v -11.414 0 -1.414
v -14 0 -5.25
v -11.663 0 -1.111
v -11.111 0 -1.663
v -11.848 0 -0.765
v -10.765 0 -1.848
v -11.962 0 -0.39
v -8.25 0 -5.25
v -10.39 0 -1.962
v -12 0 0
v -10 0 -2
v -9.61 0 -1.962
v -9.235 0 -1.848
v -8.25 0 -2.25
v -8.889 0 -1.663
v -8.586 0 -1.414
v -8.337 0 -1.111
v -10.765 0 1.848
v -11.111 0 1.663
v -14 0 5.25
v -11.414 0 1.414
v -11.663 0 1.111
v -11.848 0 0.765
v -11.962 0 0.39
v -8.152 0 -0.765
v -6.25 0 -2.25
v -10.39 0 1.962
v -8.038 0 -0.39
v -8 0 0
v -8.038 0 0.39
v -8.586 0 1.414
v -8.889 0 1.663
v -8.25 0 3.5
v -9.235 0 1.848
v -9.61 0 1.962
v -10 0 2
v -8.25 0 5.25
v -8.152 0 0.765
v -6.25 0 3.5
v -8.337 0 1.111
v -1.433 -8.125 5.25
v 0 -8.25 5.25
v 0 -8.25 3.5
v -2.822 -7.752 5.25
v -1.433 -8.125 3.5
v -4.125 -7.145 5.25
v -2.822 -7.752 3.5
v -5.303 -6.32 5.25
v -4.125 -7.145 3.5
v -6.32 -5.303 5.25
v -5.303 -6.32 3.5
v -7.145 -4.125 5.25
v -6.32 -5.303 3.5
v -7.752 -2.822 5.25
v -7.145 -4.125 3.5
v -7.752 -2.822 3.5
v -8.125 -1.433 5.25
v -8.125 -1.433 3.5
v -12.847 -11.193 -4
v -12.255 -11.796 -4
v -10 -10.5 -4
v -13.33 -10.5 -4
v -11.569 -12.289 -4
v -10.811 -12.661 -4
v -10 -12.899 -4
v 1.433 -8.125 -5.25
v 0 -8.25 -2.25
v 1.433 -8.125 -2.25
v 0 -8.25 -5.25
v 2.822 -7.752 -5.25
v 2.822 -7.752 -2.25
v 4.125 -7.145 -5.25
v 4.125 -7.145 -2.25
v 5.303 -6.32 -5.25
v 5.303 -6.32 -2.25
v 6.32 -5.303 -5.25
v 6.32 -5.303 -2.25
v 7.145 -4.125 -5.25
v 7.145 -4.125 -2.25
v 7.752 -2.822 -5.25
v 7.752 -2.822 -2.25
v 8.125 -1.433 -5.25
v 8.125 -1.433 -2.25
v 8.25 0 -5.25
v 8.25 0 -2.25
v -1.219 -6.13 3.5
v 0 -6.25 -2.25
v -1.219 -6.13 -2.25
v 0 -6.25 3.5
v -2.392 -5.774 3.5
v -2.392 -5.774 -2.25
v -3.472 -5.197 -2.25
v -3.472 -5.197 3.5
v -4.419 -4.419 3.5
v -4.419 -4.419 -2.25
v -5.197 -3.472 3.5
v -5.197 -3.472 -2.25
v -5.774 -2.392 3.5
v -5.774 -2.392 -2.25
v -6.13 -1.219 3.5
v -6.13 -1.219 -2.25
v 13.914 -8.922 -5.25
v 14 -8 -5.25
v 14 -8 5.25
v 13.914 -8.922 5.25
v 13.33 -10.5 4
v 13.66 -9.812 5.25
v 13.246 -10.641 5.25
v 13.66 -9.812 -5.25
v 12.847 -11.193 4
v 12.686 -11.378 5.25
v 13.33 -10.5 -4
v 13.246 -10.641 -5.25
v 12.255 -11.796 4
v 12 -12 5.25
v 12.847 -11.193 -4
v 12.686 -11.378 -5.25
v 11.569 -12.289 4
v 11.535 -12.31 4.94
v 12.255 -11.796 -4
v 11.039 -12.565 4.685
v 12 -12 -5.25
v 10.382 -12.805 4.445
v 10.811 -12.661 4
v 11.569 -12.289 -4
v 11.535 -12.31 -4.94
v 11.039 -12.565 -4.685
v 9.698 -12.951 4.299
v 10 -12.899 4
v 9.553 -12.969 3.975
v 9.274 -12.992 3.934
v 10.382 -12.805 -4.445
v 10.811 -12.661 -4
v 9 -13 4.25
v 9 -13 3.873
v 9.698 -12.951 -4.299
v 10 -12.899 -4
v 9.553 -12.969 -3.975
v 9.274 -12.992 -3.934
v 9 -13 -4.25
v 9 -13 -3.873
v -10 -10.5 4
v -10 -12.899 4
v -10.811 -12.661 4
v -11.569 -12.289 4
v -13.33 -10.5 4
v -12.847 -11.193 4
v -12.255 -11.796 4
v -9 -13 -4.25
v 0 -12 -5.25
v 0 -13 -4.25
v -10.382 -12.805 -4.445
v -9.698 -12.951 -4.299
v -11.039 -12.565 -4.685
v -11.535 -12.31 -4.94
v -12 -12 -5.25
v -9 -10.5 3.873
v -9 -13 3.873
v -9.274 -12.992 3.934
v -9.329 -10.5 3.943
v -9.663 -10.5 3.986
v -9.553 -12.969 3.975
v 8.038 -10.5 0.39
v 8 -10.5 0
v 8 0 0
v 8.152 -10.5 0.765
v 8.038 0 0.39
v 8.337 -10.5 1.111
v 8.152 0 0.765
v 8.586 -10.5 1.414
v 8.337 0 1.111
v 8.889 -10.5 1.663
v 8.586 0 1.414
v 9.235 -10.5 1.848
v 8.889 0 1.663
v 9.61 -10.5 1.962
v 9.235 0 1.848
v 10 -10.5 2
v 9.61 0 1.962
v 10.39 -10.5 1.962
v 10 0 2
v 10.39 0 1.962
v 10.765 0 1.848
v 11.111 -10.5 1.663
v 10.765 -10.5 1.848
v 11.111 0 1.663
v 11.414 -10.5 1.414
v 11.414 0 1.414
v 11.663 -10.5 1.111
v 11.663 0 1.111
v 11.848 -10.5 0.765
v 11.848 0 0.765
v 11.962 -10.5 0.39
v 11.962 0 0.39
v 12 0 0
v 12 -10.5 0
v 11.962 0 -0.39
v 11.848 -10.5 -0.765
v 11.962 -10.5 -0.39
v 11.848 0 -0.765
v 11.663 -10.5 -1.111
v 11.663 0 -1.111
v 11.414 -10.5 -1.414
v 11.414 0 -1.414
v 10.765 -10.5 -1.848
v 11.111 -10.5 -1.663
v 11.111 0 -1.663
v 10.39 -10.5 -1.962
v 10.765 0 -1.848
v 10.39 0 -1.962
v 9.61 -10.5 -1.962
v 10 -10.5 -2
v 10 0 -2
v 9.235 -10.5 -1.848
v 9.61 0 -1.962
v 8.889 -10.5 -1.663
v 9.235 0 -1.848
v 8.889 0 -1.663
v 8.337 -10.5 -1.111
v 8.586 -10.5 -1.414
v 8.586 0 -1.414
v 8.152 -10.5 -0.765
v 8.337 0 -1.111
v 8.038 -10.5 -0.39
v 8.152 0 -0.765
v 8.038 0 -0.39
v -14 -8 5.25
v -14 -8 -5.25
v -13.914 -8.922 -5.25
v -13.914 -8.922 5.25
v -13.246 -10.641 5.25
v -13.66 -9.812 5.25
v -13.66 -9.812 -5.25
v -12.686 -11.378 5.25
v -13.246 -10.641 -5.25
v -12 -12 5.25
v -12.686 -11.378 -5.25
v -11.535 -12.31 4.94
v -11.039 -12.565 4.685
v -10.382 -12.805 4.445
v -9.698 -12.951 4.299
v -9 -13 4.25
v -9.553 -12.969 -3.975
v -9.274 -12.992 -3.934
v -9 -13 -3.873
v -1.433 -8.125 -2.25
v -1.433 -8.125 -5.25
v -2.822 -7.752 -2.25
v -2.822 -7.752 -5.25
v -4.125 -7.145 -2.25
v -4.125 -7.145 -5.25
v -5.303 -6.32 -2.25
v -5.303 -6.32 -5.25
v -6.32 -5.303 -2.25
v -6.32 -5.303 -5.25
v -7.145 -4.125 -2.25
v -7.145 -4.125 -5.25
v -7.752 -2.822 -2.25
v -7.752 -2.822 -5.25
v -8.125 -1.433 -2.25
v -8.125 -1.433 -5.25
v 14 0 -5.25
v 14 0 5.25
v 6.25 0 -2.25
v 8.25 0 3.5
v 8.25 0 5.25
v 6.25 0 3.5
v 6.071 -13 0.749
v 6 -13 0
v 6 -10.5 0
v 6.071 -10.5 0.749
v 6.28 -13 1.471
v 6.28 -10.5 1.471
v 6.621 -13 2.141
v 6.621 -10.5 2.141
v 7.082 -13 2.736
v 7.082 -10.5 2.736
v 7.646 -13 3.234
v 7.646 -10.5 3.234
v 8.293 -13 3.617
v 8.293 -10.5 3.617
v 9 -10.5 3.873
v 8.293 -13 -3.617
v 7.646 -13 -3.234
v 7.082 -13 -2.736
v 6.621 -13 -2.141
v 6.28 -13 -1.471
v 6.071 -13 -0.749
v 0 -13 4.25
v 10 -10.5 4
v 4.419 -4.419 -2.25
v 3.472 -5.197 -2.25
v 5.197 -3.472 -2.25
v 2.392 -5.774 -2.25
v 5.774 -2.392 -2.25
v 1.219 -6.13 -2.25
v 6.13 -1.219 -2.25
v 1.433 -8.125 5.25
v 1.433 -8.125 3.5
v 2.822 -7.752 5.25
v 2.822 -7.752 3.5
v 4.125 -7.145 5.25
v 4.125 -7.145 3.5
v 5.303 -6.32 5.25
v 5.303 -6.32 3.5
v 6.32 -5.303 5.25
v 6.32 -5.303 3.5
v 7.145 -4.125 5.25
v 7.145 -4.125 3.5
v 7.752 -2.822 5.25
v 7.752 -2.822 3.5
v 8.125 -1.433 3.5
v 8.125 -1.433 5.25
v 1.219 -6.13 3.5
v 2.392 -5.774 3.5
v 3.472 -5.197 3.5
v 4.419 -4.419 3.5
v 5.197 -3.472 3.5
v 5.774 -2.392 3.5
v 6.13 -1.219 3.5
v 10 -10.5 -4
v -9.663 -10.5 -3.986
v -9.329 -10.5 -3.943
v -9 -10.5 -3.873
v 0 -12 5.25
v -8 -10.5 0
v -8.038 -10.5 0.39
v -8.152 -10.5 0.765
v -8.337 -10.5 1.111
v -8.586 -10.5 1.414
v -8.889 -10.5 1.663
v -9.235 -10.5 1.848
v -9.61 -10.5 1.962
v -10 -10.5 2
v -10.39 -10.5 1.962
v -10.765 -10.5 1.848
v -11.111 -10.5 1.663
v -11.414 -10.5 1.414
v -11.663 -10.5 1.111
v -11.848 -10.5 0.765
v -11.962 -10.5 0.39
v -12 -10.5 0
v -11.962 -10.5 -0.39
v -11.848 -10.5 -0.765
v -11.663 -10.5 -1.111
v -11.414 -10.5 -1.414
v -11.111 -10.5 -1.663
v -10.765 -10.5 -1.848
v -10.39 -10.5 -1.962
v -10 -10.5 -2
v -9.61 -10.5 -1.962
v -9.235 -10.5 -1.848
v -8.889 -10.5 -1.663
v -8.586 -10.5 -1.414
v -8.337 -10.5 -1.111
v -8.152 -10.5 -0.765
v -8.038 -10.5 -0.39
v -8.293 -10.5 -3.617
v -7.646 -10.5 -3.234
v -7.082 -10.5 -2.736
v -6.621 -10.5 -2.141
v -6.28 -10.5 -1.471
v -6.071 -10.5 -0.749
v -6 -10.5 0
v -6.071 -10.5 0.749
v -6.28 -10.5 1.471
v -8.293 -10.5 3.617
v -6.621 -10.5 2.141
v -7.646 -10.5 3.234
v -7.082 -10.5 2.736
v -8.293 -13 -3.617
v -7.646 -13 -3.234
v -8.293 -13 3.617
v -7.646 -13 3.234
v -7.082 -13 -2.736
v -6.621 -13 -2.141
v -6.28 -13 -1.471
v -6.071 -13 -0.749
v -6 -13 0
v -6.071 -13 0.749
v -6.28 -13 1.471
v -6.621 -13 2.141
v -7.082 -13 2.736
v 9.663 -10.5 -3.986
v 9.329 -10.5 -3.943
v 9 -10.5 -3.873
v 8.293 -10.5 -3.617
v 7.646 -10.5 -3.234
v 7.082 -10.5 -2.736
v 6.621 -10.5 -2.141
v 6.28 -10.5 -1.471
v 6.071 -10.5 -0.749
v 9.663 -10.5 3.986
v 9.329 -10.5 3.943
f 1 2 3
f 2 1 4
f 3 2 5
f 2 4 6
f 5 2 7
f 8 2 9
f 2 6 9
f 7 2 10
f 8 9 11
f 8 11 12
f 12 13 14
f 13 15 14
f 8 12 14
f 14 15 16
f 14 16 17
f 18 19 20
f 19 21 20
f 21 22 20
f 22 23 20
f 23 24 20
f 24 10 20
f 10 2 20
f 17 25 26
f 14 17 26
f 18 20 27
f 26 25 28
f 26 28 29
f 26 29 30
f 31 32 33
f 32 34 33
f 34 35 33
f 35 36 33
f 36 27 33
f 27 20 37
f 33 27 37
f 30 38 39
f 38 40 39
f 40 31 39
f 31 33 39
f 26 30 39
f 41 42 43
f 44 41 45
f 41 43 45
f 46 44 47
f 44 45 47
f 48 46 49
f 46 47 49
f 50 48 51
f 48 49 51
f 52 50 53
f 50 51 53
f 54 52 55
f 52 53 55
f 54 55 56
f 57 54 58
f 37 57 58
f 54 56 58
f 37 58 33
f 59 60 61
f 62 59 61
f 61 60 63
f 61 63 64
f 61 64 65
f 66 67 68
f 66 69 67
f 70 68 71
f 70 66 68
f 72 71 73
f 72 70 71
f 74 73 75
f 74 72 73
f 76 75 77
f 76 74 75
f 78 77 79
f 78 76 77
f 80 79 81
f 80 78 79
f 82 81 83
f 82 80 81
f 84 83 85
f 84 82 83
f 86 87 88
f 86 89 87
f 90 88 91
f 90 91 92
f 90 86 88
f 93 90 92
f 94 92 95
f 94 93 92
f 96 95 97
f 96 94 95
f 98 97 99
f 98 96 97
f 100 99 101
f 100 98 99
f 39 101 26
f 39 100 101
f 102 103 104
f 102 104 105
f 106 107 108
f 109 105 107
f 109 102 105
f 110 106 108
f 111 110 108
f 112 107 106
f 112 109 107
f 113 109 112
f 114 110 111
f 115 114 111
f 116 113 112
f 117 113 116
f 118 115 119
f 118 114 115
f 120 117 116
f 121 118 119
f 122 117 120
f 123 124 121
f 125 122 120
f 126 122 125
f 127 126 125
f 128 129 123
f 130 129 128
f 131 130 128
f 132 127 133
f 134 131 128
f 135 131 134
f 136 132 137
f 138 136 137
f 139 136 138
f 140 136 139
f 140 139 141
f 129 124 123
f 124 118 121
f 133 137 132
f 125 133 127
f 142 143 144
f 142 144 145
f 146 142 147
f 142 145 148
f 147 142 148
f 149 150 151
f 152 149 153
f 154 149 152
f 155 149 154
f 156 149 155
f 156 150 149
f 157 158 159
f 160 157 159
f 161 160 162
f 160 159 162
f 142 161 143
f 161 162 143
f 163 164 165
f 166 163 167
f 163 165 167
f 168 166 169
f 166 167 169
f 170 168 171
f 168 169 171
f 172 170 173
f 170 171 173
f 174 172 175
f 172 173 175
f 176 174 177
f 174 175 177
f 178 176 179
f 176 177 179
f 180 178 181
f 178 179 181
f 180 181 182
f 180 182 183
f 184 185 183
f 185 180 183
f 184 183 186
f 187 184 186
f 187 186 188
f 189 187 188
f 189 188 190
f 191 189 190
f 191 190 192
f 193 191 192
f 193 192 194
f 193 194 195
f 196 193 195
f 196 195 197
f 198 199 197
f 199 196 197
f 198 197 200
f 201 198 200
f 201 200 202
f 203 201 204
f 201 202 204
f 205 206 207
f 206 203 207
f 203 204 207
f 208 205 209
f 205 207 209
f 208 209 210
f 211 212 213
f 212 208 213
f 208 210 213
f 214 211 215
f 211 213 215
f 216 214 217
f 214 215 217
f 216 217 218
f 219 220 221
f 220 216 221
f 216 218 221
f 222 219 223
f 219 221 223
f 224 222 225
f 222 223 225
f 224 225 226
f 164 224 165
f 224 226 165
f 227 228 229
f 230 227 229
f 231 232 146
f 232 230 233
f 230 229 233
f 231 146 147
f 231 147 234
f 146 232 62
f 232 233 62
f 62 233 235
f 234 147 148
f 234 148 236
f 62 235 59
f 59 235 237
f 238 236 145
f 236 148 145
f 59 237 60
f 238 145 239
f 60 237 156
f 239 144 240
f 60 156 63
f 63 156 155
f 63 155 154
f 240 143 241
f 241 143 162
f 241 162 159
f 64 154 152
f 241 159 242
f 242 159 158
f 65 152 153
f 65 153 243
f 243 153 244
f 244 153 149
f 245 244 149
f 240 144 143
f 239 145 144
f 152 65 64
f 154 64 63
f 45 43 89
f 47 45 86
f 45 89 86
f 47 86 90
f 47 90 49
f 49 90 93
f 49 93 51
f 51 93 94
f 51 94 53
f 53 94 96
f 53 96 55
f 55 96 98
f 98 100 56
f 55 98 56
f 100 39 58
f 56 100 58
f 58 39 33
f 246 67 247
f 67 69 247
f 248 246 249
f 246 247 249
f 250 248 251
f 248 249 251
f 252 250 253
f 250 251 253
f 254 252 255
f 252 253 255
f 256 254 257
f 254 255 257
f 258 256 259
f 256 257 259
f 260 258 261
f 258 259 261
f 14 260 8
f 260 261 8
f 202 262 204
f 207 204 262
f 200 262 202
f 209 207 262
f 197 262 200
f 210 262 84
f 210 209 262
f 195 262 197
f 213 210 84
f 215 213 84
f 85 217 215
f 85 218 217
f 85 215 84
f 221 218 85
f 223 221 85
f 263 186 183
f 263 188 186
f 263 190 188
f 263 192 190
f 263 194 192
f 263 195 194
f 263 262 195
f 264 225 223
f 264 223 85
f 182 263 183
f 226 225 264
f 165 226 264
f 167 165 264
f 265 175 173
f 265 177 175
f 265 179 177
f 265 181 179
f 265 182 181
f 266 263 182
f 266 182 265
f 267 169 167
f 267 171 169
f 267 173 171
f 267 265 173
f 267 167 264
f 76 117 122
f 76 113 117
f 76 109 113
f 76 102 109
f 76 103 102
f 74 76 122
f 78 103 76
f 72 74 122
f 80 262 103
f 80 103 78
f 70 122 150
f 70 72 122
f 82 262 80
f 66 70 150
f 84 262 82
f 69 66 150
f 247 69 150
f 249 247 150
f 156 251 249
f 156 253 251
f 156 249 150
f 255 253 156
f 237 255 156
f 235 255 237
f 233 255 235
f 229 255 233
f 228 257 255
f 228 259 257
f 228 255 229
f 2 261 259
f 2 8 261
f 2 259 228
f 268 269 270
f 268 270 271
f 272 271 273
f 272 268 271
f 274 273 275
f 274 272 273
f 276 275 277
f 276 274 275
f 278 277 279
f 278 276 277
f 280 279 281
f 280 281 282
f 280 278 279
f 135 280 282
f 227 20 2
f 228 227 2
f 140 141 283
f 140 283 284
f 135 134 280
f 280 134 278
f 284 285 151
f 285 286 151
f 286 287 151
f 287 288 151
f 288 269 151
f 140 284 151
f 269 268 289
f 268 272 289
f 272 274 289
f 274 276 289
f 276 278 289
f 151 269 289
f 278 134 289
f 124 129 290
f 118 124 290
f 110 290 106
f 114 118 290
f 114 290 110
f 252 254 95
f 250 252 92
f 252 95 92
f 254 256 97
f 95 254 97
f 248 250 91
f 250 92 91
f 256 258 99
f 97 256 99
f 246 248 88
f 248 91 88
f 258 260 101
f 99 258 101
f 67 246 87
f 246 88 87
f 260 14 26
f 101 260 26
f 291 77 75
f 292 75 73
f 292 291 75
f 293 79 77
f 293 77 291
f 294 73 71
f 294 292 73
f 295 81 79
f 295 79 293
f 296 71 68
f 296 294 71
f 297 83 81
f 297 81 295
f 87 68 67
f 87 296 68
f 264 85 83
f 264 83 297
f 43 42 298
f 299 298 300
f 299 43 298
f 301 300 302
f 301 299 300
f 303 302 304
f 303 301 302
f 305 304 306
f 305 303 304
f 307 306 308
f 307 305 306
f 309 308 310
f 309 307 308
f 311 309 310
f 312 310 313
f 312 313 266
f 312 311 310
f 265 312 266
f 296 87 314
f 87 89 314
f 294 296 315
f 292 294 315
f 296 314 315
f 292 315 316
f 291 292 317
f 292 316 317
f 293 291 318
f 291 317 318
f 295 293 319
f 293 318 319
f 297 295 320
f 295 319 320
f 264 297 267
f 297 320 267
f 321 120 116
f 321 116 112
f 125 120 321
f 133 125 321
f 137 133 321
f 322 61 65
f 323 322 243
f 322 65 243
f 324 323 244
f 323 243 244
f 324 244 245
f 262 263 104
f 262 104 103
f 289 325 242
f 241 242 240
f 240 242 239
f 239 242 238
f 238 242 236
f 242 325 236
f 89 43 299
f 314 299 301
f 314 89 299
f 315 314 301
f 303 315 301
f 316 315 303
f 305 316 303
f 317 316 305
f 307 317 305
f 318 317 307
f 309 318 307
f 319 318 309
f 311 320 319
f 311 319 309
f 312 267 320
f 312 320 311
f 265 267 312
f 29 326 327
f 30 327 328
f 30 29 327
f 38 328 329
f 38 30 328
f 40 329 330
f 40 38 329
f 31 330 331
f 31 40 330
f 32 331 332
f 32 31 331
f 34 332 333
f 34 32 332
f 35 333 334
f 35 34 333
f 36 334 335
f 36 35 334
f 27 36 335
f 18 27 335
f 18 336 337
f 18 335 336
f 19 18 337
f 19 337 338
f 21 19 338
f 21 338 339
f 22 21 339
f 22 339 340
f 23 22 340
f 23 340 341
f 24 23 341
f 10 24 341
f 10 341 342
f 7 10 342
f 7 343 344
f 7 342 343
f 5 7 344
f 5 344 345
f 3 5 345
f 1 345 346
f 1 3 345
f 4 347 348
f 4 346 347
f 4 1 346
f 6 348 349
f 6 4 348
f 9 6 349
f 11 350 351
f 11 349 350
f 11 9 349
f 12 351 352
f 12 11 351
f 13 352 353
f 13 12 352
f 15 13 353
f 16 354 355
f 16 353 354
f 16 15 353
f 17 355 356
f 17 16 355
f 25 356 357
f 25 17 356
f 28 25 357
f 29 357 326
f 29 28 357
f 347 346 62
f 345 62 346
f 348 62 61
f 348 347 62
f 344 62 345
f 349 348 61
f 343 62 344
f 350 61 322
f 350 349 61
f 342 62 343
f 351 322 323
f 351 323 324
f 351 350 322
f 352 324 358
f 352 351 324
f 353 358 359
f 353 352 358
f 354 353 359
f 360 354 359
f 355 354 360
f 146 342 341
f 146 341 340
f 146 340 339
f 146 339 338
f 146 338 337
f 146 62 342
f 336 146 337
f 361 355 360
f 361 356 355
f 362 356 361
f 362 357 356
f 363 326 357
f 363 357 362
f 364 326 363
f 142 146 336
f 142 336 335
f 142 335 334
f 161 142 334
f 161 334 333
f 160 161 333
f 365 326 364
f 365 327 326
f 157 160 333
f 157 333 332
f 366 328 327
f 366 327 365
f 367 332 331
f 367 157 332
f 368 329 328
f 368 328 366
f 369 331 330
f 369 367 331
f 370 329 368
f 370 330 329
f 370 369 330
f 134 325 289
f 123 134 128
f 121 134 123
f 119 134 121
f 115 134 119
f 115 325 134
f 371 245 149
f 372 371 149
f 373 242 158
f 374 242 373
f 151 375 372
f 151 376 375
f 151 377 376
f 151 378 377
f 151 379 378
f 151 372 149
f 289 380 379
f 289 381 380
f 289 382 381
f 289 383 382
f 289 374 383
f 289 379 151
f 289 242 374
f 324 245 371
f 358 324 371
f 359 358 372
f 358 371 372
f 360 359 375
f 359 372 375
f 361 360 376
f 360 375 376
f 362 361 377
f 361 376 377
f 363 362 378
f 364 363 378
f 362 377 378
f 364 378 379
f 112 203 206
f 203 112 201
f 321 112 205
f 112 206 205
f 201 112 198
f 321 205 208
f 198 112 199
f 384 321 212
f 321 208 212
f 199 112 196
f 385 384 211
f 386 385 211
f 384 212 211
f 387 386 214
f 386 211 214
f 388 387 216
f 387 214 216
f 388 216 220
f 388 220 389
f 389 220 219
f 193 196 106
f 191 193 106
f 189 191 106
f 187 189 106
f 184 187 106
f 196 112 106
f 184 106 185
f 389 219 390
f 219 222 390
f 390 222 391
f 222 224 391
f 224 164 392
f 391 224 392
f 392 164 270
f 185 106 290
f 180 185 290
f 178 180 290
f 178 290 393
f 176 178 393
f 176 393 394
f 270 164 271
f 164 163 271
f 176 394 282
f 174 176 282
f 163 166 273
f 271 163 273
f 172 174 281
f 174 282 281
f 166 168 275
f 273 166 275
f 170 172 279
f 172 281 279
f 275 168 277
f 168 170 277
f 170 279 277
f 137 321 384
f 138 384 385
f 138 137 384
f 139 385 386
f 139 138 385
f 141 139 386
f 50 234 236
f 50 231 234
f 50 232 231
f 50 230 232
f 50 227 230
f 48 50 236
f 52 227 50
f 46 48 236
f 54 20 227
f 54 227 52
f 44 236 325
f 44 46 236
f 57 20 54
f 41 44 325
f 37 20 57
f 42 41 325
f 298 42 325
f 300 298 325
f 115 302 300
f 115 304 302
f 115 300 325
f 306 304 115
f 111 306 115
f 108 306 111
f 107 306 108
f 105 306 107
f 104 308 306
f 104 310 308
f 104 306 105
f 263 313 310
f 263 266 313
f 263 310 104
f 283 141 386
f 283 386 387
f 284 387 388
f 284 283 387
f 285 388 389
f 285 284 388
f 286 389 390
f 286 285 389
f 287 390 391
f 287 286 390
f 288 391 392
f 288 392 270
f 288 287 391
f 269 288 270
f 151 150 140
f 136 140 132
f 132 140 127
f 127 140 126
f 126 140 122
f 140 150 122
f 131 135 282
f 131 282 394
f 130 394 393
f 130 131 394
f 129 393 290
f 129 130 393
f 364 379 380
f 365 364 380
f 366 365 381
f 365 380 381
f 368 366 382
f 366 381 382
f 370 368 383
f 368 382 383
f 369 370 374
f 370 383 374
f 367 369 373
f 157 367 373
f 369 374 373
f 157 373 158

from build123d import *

# Parameters (mm, degrees)
F0_R        = 2
F0_W        = 6.25
F0_H        = 5.75
F1_DEPTH    = 13
F3_DEPTH    = 25
F4_T1_DEPTH = 35.5
F6_DEPTH    = 2.5
F7_T1_DEPTH = 15.9435440675


# Not quite as in the source:
# - a fillet or chamfer that OpenCascade refuses, or shapes differently, is made with other operations: its cross-section is extruded or revolved along the edge and cut away or added


with BuildPart() as f1:
    # F0 (on Front) → F1 (new body)
    with BuildSketch(Plane.XZ):
        Polygon((-8.25, 3.5), (-8.25, 5.25), (-14, 5.25), (-14, -5.25), (-8.25, -5.25), (-8.25, -2.25), (-6.25, -2.25), (-6.25, 3.5), align=None)
        with Locations((-10, 0)):
            Circle(F0_R, mode=Mode.SUBTRACT)
        with Locations((-10, 0)):
            Circle(F0_R)
        Polygon((0, 3.5), (0, 5.25), (-8.25, 5.25), (-8.25, 3.5), (-6.25, 3.5), align=None)
        with Locations((-3.125, 0.625)):
            Rectangle(F0_W, F0_H)
        Polygon((0, -5.25), (0, -2.25), (-6.25, -2.25), (-8.25, -2.25), (-8.25, -5.25), align=None)
    extrude(amount=F1_DEPTH)

    # F0 (on Front) → F2 (revolve, cut)
    with BuildSketch(Plane.XZ):
        Polygon((0, 3.5), (0, 5.25), (-8.25, 5.25), (-8.25, 3.5), (-6.25, 3.5), align=None)
        with Locations((-3.125, 0.625)):
            Rectangle(F0_W, F0_H)
        Polygon((0, -5.25), (0, -2.25), (-6.25, -2.25), (-8.25, -2.25), (-8.25, -5.25), align=None)
    revolve(axis=Axis((0, 0, 0), (0, 0, -1)), mode=Mode.SUBTRACT)

    # F0 (on Front) → F3 (cut)
    with BuildSketch(Plane.XZ):
        with Locations((-10, 0)):
            Circle(F0_R)
    extrude(amount=F3_DEPTH, mode=Mode.SUBTRACT)

    # F4: fillet of radius 5 on 1 edges, made by hand

    # F4_s2 → F4_t1 (cut)
    with BuildSketch(Plane.XY.offset(-17.75)):
        with BuildLine():
            ThreePointArc((-14, -8), (-12.5355339059, -11.5355339059), (-9, -13))
            Line((-9, -13), (-14, -13))
            Line((-14, -13), (-14, -8))
        make_face()
    extrude(amount=F4_T1_DEPTH, mode=Mode.SUBTRACT)

    # F5 (on face) → F6 (cut)
    with BuildSketch(Plane.XZ.offset(13)):
        with BuildLine():
            Line((-17.9225690663, -4), (-10, -4))
            ThreePointArc((-10, -4), (-12.8284271247, -2.8284271247), (-14, 0))
            Line((-14, 0), (-17.9225690663, 0))
            Line((-17.9225690663, 0), (-17.9225690663, -4))
        make_face()
        with BuildLine():
            ThreePointArc((-14, 0), (-12.8284271247, 2.8284271247), (-10, 4))
            Line((-10, 4), (-17.9225690663, 4))
            Line((-17.9225690663, 4), (-17.9225690663, 0))
            Line((-17.9225690663, 0), (-14, 0))
        make_face()
        with BuildLine():
            Line((-10, 0), (-10, 4))
            ThreePointArc((-10, 4), (-12.8284271247, 2.8284271247), (-14, 0))
            Line((-14, 0), (-10, 0))
        make_face()
        with BuildLine():
            ThreePointArc((-9, -3.8729833462), (-6.8377223398, -2.4494897428), (-6, 0))
            ThreePointArc((-6, 0), (-6.8377223398, 2.4494897428), (-9, 3.8729833462))
            Line((-9, 3.8729833462), (-9, 1.7320508076))
            ThreePointArc((-9, 1.7320508076), (-8.2679491924, 1), (-8, 0))
            ThreePointArc((-8, 0), (-8.2679491924, -1), (-9, -1.7320508076))
            Line((-9, -1.7320508076), (-9, -3.8729833462))
        make_face()
        with BuildLine():
            Line((-9, 1.7320508076), (-9, 3.8729833462))
            ThreePointArc((-9, 3.8729833462), (-9.4959828301, 3.9681187851), (-10, 4))
            Line((-10, 4), (-10, 0))
            Line((-10, 0), (-10, -4))
            ThreePointArc((-10, -4), (-9.4959828301, -3.9681187851), (-9, -3.8729833462))
            Line((-9, -3.8729833462), (-9, -1.7320508076))
            ThreePointArc((-9, -1.7320508076), (-8.2679491924, -1), (-8, 0))
            ThreePointArc((-8, 0), (-8.2679491924, 1), (-9, 1.7320508076))
        make_face()
        with BuildLine():
            ThreePointArc((-14, 0), (-12.8284271247, -2.8284271247), (-10, -4))
            Line((-10, -4), (-10, 0))
            Line((-10, 0), (-14, 0))
        make_face()
    extrude(amount=-F6_DEPTH, mode=Mode.SUBTRACT)

    # F7: chamfer of 1 on 2 edges, made by hand

    # F7_s2 → F7_t1 (cut)
    with BuildSketch(Plane.YZ.offset(-13.3718610795)):
        Polygon((-12, -5.25), (-13, -4.25), (-13, -5.25), align=None)
        Polygon((-12, 5.25), (-13, 4.25), (-13, 5.25), align=None)
    extrude(amount=F7_T1_DEPTH, mode=Mode.SUBTRACT)

    # F8: F1 across face


with BuildPart() as f1_1:
    add(f1.part)
    add(f1.part.mirror(Plane(origin=(0, -9.948326432, 0.119047619), x_dir=(0, 1, 0), z_dir=(1, 0, 0))))


solid = f1_1.part
